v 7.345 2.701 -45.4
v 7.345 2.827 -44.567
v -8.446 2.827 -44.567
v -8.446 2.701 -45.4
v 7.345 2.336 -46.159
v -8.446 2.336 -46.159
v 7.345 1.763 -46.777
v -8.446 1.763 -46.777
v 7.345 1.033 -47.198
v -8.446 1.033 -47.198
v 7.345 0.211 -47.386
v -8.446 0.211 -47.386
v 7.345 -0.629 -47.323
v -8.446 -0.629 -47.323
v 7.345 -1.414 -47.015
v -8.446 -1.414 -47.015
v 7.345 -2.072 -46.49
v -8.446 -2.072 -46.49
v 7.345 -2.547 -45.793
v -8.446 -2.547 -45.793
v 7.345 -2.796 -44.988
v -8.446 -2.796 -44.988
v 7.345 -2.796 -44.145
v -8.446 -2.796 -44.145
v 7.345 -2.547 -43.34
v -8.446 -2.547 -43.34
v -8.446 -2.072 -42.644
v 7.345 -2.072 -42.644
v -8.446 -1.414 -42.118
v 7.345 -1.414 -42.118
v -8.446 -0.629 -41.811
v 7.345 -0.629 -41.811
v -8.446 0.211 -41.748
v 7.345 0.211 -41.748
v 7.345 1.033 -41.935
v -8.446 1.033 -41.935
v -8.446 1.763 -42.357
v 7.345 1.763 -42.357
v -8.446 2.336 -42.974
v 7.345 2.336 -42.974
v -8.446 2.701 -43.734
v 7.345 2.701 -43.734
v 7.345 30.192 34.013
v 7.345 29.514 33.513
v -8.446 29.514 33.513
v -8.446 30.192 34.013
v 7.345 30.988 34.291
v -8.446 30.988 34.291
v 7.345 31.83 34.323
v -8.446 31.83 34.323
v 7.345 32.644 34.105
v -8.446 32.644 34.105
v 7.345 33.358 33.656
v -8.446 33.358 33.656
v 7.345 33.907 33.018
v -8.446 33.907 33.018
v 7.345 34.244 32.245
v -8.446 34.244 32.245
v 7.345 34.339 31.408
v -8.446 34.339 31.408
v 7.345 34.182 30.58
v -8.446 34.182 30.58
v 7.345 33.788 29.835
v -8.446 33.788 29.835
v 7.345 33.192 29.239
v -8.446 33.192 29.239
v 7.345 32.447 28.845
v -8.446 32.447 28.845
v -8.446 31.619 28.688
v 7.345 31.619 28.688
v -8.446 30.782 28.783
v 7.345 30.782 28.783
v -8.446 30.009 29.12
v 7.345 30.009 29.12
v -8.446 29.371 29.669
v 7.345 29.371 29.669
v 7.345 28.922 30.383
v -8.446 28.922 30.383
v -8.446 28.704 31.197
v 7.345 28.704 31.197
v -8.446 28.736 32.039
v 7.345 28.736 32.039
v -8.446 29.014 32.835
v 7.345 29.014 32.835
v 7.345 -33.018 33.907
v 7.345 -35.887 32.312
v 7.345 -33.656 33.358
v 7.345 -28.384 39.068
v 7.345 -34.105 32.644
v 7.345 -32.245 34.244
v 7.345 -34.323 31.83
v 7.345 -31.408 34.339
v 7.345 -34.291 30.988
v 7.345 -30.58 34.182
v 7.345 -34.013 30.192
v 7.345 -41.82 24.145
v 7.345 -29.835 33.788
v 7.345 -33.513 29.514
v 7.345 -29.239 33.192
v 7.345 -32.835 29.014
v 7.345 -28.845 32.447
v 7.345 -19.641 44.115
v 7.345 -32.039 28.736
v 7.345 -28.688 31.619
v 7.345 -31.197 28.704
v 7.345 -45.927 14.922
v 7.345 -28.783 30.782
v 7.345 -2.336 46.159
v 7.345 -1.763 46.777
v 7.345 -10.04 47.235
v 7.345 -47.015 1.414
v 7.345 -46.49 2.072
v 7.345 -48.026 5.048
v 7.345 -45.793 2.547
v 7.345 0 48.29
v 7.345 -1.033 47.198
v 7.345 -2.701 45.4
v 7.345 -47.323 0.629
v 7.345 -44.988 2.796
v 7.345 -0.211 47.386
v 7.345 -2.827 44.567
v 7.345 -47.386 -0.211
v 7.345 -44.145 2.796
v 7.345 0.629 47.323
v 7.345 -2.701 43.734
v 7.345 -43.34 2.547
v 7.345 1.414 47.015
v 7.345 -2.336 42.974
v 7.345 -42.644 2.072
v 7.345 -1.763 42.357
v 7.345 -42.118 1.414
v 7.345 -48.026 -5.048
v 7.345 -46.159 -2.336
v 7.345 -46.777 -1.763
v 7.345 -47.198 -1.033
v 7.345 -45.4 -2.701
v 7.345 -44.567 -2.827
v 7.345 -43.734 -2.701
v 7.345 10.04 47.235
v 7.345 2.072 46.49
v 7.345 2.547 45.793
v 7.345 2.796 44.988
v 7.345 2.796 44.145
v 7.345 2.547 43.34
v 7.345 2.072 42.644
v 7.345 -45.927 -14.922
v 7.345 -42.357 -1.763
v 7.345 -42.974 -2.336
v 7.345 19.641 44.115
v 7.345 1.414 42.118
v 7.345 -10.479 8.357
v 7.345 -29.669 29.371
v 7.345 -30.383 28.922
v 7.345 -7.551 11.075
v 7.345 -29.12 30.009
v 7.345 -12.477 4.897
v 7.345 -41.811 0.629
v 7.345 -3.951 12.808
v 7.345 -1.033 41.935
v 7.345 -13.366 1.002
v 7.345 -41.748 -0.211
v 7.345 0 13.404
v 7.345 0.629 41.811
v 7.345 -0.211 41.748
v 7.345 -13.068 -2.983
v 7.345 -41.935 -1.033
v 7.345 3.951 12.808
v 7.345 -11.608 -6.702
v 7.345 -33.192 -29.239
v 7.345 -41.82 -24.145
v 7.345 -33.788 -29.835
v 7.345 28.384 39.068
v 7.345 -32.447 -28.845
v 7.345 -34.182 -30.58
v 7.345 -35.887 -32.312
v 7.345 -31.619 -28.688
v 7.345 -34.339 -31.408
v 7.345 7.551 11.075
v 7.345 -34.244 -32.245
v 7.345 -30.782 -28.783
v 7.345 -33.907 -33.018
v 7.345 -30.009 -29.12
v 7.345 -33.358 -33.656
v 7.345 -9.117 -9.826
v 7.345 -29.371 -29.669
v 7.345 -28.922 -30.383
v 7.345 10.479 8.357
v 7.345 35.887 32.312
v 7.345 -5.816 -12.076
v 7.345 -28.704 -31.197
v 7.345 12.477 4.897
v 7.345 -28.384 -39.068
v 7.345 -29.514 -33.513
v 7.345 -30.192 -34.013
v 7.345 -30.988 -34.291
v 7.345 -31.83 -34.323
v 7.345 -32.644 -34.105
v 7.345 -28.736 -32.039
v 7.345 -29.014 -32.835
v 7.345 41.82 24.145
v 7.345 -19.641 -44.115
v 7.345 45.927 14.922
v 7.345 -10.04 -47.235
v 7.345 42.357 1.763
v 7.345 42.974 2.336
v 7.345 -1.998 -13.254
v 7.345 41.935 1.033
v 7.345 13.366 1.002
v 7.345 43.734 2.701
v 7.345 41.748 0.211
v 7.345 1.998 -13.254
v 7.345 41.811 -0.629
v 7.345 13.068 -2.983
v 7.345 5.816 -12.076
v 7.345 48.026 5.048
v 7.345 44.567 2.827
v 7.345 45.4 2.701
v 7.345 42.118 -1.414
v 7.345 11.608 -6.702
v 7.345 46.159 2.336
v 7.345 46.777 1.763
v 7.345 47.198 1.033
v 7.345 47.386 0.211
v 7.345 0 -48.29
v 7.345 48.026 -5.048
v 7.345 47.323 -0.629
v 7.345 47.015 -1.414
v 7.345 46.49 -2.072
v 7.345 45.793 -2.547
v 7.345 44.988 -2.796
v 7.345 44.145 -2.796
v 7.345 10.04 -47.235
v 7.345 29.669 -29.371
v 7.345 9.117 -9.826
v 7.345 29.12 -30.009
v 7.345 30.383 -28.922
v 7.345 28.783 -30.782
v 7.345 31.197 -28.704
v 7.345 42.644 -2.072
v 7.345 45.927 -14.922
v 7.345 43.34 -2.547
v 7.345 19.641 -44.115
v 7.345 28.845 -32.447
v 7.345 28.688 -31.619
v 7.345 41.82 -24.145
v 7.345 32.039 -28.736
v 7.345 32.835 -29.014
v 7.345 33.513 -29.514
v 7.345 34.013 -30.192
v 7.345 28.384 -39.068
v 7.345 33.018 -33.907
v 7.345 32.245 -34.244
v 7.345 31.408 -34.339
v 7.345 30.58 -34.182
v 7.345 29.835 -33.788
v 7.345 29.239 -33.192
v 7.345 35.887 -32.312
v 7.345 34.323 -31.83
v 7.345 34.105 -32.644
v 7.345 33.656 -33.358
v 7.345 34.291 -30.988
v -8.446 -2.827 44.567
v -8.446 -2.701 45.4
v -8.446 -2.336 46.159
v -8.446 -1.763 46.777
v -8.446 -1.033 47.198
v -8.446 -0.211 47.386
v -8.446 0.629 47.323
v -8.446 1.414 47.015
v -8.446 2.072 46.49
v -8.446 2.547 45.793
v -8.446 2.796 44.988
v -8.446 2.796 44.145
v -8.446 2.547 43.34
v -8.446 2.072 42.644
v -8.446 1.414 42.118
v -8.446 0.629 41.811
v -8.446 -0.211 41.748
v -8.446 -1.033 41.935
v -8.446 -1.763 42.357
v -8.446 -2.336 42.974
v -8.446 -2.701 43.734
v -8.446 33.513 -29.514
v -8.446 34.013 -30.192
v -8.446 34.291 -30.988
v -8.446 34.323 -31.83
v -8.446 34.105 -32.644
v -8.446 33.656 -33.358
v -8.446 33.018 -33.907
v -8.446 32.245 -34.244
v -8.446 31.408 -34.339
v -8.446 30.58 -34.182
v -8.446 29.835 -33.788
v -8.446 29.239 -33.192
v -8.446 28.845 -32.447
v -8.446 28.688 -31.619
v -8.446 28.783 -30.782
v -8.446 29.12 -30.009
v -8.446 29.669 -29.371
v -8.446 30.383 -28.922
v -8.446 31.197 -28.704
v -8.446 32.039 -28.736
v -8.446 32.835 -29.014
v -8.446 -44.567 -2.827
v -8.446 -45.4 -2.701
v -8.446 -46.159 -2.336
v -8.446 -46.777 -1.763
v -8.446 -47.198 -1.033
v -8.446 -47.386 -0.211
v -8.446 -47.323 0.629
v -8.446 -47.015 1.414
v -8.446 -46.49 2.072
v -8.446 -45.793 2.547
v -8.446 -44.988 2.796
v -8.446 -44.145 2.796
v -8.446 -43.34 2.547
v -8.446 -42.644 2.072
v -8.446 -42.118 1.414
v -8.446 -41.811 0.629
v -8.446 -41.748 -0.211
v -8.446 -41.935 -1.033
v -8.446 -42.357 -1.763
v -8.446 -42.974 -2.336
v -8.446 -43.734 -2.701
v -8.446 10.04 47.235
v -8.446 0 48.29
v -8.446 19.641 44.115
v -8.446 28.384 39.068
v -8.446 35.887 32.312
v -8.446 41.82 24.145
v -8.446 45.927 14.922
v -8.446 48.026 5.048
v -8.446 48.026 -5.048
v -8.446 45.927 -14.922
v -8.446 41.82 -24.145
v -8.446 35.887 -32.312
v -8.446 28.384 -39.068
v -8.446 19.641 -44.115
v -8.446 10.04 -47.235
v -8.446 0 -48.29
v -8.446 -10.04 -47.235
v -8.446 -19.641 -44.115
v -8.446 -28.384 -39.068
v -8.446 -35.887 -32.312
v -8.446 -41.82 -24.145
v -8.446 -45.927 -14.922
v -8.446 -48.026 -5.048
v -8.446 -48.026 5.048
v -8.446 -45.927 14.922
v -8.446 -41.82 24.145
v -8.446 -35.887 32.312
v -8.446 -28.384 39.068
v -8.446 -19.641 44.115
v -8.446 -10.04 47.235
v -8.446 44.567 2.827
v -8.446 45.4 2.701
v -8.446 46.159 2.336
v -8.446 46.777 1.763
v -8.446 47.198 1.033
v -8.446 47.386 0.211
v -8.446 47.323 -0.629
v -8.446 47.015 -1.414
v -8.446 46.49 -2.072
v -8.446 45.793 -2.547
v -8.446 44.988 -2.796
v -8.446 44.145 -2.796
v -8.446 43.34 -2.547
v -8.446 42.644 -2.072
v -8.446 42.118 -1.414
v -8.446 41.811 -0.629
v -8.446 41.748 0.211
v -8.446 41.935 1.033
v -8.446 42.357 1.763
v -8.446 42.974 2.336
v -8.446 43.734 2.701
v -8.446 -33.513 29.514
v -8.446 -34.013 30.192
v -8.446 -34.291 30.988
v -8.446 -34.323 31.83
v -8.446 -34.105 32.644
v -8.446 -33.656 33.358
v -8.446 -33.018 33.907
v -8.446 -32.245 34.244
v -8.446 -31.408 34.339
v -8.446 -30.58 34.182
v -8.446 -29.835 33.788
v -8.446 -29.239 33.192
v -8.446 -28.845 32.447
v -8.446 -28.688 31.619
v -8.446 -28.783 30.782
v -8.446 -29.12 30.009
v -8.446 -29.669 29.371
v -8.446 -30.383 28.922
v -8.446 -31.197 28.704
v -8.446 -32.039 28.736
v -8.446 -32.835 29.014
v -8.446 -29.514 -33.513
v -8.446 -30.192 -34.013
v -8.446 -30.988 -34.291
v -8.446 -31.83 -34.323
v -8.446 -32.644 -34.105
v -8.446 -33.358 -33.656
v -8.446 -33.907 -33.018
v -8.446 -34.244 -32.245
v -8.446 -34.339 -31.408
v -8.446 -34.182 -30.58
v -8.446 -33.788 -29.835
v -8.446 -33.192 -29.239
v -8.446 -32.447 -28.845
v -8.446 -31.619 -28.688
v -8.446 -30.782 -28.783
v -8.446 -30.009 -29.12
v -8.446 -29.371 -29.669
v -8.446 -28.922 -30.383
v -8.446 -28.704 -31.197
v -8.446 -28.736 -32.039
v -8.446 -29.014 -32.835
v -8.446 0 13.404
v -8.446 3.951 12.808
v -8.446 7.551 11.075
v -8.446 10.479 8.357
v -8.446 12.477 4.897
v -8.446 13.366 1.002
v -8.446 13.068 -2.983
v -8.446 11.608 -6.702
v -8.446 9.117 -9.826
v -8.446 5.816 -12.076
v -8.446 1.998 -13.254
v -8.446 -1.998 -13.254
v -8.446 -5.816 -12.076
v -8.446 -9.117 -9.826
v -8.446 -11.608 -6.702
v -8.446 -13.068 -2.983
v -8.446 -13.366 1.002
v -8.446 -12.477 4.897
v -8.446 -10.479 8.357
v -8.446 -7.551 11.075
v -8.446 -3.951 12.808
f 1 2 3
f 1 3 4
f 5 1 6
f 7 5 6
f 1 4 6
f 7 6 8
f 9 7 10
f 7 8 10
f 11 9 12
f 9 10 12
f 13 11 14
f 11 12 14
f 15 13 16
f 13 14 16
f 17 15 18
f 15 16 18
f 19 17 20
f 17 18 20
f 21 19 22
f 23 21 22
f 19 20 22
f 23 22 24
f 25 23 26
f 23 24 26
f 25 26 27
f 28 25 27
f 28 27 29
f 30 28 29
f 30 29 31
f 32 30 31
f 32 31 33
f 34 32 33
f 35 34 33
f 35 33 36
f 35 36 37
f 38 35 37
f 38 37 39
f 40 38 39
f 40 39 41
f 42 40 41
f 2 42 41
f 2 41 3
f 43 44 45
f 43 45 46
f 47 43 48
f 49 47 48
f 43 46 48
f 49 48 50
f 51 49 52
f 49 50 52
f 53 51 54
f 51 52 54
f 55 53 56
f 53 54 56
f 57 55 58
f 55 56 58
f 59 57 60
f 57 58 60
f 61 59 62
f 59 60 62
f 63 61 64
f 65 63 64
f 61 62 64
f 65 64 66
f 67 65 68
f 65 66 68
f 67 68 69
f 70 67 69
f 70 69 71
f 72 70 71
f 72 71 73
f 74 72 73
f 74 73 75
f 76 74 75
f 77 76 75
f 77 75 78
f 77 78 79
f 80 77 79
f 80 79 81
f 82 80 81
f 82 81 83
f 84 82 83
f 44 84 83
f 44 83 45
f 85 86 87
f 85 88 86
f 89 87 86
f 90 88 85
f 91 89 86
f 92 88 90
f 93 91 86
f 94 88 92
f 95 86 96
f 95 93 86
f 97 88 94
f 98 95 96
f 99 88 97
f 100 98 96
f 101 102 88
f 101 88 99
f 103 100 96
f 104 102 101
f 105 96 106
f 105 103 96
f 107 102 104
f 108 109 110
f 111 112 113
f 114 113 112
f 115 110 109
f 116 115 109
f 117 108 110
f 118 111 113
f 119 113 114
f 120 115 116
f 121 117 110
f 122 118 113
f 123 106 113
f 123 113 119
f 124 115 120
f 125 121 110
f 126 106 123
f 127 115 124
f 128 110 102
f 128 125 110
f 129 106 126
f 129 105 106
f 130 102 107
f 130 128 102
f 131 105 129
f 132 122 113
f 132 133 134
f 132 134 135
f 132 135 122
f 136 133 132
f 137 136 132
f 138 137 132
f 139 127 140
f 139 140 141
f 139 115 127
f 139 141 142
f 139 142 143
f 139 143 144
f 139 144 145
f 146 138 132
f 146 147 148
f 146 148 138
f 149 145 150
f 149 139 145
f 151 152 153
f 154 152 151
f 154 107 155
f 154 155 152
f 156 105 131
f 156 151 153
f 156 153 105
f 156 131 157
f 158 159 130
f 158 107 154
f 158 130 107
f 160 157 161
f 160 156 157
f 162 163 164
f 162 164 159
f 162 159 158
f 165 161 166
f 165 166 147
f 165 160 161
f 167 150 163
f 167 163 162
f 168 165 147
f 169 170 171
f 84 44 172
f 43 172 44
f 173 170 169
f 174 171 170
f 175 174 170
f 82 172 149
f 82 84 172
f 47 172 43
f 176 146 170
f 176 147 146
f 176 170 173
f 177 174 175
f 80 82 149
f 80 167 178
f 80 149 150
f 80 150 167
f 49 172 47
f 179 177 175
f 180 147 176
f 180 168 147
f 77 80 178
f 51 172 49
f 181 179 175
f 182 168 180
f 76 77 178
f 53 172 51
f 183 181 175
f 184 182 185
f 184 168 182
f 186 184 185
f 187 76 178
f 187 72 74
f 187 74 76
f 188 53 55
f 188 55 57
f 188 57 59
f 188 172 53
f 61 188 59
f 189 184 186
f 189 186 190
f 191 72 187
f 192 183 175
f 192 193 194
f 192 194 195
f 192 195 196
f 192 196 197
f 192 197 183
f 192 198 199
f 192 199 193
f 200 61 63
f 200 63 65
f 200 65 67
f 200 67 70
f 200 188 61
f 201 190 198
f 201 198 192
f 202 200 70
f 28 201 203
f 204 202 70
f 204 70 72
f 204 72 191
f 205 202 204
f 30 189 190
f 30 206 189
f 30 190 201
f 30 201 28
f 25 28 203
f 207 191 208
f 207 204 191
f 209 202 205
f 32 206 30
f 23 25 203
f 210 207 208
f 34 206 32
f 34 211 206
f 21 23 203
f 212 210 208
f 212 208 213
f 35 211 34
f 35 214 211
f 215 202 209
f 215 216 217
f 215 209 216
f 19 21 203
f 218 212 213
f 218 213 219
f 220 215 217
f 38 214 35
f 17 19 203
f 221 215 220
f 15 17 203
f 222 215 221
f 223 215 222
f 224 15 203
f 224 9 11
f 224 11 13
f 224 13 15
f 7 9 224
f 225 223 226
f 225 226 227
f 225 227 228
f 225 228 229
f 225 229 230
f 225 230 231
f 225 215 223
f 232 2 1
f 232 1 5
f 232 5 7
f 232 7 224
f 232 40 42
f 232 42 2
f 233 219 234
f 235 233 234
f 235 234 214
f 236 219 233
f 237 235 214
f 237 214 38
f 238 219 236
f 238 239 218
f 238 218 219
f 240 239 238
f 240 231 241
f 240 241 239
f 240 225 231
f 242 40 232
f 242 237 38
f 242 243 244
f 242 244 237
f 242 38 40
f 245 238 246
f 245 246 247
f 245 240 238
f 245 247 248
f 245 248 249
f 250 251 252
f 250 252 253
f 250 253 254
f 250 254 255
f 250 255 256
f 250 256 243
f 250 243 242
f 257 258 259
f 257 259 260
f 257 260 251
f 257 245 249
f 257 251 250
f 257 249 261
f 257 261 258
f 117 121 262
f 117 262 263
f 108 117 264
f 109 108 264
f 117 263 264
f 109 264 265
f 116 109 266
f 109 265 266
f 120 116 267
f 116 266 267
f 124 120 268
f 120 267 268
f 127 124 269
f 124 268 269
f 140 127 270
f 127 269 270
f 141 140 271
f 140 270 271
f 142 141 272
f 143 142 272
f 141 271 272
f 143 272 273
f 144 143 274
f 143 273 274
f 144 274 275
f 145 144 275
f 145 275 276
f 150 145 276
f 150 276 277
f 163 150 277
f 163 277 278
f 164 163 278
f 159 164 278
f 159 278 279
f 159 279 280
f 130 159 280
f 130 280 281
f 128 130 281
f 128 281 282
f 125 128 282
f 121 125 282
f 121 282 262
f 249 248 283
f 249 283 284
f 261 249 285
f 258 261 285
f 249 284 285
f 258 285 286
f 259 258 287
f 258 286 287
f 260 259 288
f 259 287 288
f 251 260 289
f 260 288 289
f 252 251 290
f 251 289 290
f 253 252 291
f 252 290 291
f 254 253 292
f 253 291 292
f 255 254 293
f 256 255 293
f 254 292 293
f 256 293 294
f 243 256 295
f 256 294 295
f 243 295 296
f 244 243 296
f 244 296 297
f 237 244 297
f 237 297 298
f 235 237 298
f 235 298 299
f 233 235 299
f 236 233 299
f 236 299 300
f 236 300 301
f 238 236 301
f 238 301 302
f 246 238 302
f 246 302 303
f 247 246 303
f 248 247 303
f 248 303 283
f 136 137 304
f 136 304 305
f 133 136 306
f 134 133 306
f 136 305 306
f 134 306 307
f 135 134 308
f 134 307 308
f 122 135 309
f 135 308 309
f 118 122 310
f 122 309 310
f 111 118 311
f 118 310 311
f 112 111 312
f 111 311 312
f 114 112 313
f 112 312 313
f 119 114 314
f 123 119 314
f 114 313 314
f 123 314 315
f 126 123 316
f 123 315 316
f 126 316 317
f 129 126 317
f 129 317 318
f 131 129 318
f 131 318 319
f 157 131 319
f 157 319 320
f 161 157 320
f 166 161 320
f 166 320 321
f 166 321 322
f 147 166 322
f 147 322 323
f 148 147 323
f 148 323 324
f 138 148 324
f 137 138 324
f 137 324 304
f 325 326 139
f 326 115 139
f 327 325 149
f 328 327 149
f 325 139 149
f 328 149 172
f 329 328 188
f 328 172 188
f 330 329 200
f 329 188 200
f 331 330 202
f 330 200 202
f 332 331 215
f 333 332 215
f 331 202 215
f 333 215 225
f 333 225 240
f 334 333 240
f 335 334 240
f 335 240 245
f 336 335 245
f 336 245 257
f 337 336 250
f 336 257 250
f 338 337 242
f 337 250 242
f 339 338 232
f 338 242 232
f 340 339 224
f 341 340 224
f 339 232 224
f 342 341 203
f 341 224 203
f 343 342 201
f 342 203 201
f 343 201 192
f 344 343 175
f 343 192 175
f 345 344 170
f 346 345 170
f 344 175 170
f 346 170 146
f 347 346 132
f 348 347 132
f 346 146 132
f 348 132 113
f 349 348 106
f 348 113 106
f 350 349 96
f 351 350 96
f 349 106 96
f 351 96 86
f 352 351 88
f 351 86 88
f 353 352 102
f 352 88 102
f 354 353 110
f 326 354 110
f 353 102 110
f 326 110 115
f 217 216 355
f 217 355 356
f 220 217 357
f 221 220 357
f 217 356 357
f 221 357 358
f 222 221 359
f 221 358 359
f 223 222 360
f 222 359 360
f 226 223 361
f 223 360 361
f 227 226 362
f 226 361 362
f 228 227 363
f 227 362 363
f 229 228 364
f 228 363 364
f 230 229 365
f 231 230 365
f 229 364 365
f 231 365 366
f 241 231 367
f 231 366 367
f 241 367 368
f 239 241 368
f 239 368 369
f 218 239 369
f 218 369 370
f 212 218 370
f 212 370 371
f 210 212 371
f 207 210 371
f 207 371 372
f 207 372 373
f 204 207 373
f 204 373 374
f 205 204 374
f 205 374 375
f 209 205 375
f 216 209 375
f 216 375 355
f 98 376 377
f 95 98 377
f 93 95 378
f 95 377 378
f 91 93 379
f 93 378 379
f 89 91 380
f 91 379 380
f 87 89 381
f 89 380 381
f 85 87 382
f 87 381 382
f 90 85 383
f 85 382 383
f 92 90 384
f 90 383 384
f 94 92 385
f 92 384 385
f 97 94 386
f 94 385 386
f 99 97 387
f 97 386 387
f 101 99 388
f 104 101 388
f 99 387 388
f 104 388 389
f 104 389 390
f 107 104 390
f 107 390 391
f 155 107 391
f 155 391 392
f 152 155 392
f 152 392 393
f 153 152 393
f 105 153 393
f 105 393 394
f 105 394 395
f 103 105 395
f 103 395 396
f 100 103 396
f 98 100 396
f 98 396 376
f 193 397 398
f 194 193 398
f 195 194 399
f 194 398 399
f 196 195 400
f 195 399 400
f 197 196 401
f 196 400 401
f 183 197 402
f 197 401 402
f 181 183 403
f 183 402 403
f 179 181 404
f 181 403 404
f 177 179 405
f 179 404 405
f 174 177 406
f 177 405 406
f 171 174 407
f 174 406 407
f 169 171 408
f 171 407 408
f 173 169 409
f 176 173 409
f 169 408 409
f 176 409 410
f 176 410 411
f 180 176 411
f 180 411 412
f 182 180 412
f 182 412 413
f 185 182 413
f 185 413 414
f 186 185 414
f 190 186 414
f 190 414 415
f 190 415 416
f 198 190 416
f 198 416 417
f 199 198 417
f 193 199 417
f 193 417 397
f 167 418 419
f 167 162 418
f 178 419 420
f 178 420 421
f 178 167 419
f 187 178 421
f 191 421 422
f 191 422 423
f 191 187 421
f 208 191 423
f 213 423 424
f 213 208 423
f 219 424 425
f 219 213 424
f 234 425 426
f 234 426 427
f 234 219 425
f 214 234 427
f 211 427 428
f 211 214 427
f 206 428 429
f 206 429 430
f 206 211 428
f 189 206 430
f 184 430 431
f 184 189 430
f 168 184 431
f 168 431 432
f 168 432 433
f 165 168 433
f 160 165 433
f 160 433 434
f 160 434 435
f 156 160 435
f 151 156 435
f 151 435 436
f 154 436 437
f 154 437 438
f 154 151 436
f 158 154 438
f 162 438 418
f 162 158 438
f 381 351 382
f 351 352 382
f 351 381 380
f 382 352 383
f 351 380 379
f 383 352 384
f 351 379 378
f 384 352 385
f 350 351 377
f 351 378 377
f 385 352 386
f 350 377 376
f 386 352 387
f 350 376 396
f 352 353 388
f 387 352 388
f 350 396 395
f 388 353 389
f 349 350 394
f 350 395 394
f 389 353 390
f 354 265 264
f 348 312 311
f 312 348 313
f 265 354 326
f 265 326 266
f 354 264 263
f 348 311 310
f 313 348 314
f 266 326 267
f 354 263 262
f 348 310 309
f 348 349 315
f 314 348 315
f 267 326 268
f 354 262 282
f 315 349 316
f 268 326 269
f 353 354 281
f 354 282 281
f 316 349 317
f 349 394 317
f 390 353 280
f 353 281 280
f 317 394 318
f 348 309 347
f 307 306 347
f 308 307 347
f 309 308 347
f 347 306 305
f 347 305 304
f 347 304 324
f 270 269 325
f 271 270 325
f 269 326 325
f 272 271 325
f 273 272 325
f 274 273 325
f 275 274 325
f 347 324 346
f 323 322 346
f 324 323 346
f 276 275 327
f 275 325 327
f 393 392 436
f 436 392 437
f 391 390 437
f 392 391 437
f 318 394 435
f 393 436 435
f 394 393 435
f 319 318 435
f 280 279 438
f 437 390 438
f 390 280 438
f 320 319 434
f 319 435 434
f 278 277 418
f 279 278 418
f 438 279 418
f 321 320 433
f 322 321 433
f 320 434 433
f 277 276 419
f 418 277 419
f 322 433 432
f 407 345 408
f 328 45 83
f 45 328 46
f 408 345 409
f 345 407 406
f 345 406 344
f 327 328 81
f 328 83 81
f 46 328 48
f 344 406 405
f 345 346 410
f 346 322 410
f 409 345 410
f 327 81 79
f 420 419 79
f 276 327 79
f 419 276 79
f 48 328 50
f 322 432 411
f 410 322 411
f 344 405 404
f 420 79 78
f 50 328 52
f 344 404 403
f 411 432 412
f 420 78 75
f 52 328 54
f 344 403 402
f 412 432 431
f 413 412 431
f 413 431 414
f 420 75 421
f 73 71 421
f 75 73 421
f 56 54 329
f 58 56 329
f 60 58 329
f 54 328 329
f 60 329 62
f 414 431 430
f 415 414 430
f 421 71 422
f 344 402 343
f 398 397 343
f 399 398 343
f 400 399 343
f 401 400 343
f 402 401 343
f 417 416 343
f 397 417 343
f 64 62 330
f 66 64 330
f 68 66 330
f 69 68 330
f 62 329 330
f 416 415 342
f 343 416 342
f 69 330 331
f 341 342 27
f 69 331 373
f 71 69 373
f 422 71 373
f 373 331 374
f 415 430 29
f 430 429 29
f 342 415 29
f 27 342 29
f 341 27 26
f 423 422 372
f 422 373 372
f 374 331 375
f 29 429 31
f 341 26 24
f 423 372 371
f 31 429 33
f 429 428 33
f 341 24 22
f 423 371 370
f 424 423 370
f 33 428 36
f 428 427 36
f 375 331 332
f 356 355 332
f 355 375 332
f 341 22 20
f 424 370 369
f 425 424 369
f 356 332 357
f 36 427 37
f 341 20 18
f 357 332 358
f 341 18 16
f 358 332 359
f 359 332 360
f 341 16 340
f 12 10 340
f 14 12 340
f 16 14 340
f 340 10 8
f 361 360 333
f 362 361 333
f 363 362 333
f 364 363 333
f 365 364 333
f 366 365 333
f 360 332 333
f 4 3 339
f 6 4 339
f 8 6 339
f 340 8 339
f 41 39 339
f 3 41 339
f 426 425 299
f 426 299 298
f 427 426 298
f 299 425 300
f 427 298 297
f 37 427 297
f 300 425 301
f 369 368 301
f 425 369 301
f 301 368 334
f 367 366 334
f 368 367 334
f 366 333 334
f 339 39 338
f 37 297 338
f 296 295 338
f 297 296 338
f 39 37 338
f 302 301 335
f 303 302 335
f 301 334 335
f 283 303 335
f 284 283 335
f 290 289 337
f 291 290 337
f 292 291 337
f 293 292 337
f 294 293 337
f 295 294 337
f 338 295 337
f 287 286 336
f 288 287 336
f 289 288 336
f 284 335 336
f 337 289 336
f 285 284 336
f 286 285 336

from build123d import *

# Parameters (mm, degrees)
F0_W     = 15.7906897366
F0_H     = 34.8864039406
F3_R     = 2.8270891362
F4_DEPTH = 25.4
F5_COUNT = 8


with BuildPart() as f2:
    # F0 (on Front) → F2 (revolve)
    with BuildSketch(Plane.XZ):
        with Locations((-0.5508437753, 30.8469277807)):
            Rectangle(F0_W, F0_H)
    revolve(axis=Axis((-24.62522313, 0, 0), (-1, 0, 0)))

    # F3 (on face) → F4 (cut)
    with BuildSketch(Plane(origin=(-8.4461886436, 0, 0), x_dir=(0, -1, 0), z_dir=(-1, 0, 0))):
        with Locations((0, 44.5668138564)):
            Circle(F3_R)
    f4 = extrude(amount=-F4_DEPTH, mode=Mode.SUBTRACT)

    # F5: F4 ×8 about axis
    f5_axis = Axis((-8.4461886436, 0, 0), (-1, 0, 0))
    for i in range(1, F5_COUNT):
        add(f4.rotate(f5_axis, i * 360 / F5_COUNT), mode=Mode.SUBTRACT)


solid = f2.part
